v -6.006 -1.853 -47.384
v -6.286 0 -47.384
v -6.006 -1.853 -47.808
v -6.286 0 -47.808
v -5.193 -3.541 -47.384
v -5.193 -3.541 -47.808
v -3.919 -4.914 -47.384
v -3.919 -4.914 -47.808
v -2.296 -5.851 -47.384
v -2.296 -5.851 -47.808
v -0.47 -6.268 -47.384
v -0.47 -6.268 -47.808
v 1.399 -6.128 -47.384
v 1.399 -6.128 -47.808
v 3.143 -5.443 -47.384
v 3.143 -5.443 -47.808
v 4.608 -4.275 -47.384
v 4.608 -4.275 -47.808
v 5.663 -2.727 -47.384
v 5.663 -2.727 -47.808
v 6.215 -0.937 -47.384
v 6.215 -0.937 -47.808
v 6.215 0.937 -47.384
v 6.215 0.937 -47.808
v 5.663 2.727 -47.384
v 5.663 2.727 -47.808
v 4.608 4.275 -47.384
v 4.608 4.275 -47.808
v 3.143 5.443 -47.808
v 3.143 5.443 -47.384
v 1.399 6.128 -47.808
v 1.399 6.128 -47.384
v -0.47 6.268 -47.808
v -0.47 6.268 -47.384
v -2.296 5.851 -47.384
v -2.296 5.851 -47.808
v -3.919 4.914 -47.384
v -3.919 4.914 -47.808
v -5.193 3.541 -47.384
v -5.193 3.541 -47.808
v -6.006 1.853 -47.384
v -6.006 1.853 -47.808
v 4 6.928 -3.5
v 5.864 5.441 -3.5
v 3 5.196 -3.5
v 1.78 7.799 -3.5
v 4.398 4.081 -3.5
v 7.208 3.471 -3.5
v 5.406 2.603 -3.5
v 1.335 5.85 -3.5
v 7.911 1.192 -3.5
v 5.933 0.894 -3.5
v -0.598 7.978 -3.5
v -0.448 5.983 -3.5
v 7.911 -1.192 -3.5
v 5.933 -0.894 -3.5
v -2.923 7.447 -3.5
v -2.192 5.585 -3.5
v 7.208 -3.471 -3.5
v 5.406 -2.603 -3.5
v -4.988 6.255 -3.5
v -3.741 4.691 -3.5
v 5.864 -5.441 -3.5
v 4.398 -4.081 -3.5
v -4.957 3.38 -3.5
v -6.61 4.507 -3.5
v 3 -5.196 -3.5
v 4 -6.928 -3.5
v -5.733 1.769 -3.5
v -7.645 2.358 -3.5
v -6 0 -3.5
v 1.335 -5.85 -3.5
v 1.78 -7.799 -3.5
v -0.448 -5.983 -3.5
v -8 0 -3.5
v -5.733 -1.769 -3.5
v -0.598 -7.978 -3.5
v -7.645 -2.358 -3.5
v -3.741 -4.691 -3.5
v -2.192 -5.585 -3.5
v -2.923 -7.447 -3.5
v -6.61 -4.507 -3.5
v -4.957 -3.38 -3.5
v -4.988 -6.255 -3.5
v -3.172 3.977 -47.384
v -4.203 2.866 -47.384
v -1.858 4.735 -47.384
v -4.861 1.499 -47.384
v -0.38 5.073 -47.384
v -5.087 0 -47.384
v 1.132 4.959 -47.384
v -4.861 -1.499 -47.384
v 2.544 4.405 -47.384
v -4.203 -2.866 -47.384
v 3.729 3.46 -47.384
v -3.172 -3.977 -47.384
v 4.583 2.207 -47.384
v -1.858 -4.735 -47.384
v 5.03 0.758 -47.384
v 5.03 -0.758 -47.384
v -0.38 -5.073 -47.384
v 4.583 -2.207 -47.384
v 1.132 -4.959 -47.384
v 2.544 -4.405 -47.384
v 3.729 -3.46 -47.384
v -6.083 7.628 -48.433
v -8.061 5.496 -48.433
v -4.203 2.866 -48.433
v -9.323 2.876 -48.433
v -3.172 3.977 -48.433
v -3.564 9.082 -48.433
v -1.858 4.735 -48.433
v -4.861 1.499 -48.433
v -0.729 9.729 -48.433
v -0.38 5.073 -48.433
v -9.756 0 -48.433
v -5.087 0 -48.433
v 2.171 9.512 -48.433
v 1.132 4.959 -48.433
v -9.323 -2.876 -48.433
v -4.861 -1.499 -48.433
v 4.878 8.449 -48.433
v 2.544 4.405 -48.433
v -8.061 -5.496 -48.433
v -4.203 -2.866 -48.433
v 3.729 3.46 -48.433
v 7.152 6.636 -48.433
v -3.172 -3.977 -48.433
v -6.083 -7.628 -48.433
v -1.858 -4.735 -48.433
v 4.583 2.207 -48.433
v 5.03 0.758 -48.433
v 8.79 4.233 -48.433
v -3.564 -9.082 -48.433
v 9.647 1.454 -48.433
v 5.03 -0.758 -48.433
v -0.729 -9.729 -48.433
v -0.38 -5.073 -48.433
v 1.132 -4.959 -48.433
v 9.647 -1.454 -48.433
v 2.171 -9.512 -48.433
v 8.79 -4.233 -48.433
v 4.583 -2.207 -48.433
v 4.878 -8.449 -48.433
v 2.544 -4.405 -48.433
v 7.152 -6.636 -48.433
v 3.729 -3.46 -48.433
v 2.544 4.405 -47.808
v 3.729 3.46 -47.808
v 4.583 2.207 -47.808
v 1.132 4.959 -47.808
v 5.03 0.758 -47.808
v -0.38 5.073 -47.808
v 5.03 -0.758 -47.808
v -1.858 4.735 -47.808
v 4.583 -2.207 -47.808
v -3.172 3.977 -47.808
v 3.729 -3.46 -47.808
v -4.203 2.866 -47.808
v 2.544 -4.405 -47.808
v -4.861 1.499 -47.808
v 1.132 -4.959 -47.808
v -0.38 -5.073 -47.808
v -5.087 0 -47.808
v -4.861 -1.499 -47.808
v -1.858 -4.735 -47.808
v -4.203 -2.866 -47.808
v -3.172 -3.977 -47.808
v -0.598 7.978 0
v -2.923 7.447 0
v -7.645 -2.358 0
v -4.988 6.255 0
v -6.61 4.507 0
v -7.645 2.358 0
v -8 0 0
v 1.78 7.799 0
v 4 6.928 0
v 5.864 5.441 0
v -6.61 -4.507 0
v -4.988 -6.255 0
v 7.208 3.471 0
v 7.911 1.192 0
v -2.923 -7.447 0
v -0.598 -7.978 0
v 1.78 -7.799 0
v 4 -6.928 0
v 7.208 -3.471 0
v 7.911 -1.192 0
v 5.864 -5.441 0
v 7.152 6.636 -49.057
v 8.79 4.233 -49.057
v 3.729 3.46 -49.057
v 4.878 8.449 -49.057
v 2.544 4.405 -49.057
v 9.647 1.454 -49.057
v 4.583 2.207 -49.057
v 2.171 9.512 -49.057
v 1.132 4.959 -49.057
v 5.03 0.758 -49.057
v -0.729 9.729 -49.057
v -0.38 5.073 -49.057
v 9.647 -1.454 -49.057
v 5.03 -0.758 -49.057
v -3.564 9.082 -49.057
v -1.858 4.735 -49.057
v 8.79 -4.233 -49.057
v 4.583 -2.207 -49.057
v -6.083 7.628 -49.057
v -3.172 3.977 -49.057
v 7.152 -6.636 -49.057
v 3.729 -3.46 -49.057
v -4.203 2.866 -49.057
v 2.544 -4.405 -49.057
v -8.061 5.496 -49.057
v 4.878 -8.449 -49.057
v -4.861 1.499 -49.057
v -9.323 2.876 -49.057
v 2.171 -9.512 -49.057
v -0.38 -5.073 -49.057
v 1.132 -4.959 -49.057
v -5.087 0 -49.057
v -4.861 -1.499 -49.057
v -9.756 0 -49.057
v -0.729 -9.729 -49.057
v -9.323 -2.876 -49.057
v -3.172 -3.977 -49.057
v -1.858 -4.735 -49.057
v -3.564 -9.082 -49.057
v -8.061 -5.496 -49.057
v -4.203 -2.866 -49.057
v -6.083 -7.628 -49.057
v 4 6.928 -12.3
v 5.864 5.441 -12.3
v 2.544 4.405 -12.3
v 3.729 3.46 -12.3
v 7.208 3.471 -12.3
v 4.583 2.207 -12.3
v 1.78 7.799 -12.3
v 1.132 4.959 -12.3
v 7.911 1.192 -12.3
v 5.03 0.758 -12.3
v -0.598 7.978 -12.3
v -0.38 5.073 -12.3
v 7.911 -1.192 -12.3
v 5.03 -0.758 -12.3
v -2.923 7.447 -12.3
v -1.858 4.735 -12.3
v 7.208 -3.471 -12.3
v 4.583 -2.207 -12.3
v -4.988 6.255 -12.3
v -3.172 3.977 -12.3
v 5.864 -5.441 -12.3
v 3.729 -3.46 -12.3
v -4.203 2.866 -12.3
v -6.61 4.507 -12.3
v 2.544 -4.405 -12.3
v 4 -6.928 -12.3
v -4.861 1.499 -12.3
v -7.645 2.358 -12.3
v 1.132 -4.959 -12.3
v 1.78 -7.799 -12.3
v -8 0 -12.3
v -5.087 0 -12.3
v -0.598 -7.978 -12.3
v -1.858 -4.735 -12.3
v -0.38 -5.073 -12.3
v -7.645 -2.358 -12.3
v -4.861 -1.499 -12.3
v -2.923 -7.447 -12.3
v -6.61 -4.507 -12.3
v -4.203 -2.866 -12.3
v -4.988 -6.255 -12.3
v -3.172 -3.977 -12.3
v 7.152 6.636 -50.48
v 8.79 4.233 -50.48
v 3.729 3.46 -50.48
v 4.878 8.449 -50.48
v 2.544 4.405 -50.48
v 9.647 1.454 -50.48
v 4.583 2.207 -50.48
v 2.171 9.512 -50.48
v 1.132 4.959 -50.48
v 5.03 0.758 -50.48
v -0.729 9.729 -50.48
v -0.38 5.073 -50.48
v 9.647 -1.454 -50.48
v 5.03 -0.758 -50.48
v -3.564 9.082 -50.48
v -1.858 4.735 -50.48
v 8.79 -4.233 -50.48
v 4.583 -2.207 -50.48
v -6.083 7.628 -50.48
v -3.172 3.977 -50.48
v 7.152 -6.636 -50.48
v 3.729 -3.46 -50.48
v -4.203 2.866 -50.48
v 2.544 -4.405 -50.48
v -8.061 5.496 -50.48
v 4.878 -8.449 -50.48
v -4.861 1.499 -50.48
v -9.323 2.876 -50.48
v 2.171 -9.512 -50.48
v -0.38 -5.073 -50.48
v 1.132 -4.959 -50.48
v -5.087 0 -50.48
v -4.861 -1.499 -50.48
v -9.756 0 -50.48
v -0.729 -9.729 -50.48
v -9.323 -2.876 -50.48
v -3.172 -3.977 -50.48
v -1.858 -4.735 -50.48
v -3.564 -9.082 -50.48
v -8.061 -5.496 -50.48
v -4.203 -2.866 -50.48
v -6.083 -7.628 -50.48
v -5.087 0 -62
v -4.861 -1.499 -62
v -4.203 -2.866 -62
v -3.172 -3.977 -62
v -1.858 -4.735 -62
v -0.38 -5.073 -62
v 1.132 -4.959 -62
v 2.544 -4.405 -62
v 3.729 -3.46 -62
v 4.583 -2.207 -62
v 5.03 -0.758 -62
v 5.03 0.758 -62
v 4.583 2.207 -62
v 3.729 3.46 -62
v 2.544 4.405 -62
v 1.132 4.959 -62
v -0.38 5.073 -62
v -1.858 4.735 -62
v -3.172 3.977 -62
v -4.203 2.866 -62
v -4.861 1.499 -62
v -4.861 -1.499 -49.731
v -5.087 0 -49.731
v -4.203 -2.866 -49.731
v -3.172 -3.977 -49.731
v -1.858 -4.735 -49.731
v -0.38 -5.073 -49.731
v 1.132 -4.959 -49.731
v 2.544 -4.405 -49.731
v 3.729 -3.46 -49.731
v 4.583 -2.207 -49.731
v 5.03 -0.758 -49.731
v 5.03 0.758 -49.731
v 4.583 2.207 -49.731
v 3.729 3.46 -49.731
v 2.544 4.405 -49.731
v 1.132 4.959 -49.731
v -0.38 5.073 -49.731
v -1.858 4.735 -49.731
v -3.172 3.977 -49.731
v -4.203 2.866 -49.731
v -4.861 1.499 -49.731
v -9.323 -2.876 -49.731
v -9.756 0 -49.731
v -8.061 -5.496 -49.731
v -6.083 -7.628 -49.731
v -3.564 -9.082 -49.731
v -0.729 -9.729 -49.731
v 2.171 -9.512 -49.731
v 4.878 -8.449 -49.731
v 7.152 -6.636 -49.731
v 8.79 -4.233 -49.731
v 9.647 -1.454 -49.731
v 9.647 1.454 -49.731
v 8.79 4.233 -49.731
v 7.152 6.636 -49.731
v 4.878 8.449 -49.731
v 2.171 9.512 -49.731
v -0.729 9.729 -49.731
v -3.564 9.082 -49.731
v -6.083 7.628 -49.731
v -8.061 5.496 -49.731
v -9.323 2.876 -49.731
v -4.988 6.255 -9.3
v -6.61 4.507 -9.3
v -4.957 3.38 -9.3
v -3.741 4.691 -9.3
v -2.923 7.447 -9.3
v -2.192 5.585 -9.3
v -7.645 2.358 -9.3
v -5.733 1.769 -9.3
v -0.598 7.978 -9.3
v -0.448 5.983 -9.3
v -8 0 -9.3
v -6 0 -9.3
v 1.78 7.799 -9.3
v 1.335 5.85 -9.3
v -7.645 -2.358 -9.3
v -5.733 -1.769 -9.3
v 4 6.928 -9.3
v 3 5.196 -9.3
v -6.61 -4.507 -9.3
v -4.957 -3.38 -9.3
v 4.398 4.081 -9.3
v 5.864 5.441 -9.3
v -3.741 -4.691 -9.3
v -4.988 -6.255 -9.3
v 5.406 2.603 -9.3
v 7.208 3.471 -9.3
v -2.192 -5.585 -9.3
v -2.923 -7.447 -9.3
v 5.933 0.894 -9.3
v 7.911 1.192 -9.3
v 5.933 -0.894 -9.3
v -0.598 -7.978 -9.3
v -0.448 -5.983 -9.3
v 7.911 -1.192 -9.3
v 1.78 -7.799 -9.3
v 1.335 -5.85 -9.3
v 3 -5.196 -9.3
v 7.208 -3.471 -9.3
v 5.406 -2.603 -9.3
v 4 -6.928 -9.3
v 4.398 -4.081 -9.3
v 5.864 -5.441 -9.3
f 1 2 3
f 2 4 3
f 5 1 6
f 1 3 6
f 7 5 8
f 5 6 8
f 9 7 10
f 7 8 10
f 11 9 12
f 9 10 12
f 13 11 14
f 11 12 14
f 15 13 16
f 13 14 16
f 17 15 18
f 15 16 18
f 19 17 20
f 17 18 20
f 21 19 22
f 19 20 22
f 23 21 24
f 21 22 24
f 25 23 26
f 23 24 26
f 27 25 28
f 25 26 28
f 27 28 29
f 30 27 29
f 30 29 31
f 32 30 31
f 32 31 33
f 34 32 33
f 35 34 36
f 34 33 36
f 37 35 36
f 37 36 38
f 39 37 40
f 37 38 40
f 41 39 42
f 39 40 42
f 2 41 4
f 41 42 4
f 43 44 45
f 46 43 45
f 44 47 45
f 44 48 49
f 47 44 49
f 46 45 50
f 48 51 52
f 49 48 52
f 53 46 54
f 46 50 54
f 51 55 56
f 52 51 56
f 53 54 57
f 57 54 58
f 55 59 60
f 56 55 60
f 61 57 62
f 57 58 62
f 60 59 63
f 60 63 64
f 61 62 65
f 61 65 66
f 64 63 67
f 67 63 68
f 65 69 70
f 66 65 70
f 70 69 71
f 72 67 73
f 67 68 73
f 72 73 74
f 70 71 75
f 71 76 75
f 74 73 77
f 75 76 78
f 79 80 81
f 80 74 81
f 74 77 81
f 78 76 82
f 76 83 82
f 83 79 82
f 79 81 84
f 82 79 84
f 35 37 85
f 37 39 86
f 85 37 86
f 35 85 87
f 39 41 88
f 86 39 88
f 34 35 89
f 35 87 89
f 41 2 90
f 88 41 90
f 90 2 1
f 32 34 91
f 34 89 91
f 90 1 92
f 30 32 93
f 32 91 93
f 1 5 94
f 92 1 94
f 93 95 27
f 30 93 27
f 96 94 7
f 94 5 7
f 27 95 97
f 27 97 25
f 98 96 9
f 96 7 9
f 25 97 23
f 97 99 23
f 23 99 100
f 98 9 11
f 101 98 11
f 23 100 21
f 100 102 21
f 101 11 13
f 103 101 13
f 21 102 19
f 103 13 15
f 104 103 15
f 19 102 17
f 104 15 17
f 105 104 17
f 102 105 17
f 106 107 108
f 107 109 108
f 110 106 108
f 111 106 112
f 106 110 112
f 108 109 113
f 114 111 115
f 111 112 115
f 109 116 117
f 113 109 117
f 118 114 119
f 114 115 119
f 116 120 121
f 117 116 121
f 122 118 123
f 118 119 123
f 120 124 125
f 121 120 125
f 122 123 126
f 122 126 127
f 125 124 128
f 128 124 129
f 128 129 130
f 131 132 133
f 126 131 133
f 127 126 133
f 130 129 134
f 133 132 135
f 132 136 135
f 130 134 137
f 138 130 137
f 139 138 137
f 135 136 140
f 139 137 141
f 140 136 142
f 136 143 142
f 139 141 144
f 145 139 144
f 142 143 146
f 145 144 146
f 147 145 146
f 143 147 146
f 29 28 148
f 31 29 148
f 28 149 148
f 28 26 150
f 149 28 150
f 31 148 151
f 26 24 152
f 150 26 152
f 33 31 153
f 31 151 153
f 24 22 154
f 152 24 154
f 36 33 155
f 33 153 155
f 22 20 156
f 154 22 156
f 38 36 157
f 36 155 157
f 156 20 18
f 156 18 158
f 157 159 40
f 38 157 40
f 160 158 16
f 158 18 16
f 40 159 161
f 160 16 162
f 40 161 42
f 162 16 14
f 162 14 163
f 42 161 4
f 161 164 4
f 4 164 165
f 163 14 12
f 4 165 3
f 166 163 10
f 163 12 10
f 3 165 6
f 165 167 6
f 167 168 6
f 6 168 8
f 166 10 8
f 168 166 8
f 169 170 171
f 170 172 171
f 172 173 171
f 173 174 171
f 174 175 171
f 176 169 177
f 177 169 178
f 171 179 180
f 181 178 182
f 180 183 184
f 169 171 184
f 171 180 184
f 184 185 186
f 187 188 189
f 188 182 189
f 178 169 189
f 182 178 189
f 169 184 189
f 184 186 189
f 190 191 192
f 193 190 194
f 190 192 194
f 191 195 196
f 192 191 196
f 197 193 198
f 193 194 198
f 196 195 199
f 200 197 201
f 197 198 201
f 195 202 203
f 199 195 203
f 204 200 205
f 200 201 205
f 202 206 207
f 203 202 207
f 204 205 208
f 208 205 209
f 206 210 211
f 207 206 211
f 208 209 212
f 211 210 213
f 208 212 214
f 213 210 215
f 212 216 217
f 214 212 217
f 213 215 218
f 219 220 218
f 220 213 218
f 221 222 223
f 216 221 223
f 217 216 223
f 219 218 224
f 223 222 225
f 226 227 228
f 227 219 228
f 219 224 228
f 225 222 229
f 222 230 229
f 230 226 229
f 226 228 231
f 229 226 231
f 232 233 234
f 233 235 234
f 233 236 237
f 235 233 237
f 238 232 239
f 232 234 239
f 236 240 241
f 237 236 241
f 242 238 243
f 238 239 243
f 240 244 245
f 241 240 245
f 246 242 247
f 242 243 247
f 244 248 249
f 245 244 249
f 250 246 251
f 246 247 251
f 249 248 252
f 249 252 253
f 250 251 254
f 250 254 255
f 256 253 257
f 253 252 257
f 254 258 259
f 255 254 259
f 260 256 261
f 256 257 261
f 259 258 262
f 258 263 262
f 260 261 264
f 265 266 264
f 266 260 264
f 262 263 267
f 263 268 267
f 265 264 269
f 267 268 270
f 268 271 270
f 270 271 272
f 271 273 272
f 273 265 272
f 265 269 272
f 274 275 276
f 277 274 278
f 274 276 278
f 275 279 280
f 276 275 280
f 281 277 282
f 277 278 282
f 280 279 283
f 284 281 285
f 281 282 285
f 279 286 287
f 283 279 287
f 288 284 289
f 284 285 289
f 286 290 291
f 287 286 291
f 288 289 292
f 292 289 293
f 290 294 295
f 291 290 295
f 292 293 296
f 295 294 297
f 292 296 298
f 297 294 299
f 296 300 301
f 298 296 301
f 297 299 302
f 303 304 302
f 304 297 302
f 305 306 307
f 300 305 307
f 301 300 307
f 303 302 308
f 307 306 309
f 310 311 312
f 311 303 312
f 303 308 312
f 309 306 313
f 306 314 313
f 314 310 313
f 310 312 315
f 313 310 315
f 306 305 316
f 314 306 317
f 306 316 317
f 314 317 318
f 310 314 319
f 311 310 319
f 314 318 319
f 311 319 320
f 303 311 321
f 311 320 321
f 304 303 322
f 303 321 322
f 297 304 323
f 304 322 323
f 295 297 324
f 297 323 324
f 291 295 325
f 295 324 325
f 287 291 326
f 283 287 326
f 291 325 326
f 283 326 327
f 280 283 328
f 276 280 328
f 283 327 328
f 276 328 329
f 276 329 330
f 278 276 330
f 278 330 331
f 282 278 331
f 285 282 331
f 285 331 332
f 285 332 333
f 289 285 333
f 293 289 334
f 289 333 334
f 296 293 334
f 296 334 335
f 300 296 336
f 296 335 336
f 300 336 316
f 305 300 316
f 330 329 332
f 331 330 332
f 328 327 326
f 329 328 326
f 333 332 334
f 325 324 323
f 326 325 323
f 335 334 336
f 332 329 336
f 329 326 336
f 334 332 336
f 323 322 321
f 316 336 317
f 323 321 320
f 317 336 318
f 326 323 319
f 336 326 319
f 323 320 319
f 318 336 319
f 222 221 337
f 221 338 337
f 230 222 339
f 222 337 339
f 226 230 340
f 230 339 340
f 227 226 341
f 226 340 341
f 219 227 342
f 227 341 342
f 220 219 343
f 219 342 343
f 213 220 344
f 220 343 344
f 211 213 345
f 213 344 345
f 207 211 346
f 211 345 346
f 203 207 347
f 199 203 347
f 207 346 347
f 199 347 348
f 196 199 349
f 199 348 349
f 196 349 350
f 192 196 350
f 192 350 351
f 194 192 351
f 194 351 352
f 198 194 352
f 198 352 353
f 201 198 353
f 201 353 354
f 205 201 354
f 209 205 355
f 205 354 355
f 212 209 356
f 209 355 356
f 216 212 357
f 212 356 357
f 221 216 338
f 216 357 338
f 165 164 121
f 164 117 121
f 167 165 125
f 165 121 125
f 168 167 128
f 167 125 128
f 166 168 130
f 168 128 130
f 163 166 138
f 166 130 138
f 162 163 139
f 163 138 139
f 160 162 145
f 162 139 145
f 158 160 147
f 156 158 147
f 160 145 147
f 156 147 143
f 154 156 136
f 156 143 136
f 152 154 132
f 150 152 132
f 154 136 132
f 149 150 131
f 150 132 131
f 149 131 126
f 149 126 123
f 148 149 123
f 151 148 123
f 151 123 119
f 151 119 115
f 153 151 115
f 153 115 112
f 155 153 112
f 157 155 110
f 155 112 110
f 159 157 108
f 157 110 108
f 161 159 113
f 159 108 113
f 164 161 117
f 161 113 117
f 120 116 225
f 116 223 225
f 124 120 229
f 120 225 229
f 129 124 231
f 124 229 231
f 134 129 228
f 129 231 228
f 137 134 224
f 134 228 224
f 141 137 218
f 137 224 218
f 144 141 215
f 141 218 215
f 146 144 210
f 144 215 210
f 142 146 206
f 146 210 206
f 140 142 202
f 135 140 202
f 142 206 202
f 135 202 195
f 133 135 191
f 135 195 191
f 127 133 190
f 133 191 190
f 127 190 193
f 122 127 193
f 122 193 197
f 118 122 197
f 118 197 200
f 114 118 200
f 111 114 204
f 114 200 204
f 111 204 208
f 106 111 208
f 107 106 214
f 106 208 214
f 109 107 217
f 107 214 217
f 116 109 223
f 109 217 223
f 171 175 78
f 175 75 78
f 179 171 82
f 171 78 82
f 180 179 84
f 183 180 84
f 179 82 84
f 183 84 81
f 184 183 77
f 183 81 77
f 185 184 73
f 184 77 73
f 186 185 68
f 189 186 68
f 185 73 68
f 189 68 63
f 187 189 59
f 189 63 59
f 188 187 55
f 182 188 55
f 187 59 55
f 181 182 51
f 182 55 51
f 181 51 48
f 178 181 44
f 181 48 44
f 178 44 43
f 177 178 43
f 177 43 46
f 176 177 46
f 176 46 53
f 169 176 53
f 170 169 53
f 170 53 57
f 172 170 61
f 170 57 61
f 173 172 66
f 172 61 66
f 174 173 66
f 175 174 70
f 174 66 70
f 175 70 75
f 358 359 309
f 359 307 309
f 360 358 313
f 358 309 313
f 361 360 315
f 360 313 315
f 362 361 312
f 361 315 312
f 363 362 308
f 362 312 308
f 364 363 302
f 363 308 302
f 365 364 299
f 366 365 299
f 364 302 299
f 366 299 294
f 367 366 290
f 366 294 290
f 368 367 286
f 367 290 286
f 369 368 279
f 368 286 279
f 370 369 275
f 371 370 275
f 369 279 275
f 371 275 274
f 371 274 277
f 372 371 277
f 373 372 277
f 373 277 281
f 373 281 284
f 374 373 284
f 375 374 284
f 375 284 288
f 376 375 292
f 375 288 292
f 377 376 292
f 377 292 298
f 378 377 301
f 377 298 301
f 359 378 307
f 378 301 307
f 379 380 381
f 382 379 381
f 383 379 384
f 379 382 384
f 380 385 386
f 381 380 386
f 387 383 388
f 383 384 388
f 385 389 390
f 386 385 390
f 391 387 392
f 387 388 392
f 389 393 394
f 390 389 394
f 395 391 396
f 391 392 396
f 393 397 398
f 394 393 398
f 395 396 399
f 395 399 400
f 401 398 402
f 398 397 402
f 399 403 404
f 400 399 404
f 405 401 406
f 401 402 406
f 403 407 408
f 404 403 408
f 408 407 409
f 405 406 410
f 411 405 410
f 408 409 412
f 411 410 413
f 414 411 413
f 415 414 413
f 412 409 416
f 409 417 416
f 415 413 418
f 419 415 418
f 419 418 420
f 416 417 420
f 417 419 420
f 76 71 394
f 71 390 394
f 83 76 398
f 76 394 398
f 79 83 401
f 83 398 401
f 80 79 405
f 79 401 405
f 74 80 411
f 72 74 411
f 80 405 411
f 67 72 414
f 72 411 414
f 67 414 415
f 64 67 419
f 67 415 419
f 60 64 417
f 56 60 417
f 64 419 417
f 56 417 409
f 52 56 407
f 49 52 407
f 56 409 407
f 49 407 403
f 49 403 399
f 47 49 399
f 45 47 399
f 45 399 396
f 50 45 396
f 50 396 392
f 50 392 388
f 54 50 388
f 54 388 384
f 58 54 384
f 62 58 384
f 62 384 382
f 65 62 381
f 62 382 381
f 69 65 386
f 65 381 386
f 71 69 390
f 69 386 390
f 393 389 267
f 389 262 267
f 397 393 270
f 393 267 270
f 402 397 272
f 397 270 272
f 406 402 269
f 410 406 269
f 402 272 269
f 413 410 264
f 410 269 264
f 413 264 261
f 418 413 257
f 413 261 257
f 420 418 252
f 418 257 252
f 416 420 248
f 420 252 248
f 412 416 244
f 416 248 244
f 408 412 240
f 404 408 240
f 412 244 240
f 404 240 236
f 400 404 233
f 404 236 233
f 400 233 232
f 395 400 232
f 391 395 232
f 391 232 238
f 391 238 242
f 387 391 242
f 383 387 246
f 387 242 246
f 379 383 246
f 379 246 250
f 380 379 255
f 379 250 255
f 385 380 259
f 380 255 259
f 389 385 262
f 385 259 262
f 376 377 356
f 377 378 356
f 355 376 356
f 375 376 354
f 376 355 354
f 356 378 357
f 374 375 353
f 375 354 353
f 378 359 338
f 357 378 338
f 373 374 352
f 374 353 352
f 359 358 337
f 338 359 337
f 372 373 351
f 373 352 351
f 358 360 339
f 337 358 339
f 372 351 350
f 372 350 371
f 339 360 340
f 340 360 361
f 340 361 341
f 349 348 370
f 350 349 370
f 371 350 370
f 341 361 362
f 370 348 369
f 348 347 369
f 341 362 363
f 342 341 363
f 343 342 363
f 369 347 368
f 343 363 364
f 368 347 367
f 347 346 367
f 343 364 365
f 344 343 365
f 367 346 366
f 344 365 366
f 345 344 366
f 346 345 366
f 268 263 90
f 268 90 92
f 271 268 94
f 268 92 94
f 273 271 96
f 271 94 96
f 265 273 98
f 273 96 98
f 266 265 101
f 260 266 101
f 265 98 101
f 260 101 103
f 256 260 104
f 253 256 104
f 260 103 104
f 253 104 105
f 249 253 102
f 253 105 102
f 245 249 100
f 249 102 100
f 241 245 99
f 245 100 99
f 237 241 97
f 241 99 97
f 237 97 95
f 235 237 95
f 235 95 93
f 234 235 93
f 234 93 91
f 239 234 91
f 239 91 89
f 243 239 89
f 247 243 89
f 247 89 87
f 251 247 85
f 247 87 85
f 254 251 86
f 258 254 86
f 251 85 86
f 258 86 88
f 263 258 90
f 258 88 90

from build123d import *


with BuildPart() as f1:
    # F0 (on Front) → F1 (revolve)
    with BuildSketch(Plane.XZ):
        Polygon((0, -62), (0, 0), (-8, 0), (-8, -3.5), (-6, -3.5), (-6, -9.3), (-8, -9.3), (-8, -12.3), (-5.087018, -12.3), (-5.087018, -47.38391), (-6.285568, -47.38391), (-6.285568, -47.808396), (-5.087018, -47.808396), (-5.087018, -48.432641), (-9.75637, -48.432641), (-9.75637, -49.056886), (-5.087018, -49.056886), (-5.087018, -49.731071), (-9.75637, -49.731071), (-9.75637, -50.480166), (-5.087018, -50.480166), (-5.087018, -62), align=None)
    revolve(axis=Axis((0, 0, -31), (0, 0, 1)))


solid = f1.part
